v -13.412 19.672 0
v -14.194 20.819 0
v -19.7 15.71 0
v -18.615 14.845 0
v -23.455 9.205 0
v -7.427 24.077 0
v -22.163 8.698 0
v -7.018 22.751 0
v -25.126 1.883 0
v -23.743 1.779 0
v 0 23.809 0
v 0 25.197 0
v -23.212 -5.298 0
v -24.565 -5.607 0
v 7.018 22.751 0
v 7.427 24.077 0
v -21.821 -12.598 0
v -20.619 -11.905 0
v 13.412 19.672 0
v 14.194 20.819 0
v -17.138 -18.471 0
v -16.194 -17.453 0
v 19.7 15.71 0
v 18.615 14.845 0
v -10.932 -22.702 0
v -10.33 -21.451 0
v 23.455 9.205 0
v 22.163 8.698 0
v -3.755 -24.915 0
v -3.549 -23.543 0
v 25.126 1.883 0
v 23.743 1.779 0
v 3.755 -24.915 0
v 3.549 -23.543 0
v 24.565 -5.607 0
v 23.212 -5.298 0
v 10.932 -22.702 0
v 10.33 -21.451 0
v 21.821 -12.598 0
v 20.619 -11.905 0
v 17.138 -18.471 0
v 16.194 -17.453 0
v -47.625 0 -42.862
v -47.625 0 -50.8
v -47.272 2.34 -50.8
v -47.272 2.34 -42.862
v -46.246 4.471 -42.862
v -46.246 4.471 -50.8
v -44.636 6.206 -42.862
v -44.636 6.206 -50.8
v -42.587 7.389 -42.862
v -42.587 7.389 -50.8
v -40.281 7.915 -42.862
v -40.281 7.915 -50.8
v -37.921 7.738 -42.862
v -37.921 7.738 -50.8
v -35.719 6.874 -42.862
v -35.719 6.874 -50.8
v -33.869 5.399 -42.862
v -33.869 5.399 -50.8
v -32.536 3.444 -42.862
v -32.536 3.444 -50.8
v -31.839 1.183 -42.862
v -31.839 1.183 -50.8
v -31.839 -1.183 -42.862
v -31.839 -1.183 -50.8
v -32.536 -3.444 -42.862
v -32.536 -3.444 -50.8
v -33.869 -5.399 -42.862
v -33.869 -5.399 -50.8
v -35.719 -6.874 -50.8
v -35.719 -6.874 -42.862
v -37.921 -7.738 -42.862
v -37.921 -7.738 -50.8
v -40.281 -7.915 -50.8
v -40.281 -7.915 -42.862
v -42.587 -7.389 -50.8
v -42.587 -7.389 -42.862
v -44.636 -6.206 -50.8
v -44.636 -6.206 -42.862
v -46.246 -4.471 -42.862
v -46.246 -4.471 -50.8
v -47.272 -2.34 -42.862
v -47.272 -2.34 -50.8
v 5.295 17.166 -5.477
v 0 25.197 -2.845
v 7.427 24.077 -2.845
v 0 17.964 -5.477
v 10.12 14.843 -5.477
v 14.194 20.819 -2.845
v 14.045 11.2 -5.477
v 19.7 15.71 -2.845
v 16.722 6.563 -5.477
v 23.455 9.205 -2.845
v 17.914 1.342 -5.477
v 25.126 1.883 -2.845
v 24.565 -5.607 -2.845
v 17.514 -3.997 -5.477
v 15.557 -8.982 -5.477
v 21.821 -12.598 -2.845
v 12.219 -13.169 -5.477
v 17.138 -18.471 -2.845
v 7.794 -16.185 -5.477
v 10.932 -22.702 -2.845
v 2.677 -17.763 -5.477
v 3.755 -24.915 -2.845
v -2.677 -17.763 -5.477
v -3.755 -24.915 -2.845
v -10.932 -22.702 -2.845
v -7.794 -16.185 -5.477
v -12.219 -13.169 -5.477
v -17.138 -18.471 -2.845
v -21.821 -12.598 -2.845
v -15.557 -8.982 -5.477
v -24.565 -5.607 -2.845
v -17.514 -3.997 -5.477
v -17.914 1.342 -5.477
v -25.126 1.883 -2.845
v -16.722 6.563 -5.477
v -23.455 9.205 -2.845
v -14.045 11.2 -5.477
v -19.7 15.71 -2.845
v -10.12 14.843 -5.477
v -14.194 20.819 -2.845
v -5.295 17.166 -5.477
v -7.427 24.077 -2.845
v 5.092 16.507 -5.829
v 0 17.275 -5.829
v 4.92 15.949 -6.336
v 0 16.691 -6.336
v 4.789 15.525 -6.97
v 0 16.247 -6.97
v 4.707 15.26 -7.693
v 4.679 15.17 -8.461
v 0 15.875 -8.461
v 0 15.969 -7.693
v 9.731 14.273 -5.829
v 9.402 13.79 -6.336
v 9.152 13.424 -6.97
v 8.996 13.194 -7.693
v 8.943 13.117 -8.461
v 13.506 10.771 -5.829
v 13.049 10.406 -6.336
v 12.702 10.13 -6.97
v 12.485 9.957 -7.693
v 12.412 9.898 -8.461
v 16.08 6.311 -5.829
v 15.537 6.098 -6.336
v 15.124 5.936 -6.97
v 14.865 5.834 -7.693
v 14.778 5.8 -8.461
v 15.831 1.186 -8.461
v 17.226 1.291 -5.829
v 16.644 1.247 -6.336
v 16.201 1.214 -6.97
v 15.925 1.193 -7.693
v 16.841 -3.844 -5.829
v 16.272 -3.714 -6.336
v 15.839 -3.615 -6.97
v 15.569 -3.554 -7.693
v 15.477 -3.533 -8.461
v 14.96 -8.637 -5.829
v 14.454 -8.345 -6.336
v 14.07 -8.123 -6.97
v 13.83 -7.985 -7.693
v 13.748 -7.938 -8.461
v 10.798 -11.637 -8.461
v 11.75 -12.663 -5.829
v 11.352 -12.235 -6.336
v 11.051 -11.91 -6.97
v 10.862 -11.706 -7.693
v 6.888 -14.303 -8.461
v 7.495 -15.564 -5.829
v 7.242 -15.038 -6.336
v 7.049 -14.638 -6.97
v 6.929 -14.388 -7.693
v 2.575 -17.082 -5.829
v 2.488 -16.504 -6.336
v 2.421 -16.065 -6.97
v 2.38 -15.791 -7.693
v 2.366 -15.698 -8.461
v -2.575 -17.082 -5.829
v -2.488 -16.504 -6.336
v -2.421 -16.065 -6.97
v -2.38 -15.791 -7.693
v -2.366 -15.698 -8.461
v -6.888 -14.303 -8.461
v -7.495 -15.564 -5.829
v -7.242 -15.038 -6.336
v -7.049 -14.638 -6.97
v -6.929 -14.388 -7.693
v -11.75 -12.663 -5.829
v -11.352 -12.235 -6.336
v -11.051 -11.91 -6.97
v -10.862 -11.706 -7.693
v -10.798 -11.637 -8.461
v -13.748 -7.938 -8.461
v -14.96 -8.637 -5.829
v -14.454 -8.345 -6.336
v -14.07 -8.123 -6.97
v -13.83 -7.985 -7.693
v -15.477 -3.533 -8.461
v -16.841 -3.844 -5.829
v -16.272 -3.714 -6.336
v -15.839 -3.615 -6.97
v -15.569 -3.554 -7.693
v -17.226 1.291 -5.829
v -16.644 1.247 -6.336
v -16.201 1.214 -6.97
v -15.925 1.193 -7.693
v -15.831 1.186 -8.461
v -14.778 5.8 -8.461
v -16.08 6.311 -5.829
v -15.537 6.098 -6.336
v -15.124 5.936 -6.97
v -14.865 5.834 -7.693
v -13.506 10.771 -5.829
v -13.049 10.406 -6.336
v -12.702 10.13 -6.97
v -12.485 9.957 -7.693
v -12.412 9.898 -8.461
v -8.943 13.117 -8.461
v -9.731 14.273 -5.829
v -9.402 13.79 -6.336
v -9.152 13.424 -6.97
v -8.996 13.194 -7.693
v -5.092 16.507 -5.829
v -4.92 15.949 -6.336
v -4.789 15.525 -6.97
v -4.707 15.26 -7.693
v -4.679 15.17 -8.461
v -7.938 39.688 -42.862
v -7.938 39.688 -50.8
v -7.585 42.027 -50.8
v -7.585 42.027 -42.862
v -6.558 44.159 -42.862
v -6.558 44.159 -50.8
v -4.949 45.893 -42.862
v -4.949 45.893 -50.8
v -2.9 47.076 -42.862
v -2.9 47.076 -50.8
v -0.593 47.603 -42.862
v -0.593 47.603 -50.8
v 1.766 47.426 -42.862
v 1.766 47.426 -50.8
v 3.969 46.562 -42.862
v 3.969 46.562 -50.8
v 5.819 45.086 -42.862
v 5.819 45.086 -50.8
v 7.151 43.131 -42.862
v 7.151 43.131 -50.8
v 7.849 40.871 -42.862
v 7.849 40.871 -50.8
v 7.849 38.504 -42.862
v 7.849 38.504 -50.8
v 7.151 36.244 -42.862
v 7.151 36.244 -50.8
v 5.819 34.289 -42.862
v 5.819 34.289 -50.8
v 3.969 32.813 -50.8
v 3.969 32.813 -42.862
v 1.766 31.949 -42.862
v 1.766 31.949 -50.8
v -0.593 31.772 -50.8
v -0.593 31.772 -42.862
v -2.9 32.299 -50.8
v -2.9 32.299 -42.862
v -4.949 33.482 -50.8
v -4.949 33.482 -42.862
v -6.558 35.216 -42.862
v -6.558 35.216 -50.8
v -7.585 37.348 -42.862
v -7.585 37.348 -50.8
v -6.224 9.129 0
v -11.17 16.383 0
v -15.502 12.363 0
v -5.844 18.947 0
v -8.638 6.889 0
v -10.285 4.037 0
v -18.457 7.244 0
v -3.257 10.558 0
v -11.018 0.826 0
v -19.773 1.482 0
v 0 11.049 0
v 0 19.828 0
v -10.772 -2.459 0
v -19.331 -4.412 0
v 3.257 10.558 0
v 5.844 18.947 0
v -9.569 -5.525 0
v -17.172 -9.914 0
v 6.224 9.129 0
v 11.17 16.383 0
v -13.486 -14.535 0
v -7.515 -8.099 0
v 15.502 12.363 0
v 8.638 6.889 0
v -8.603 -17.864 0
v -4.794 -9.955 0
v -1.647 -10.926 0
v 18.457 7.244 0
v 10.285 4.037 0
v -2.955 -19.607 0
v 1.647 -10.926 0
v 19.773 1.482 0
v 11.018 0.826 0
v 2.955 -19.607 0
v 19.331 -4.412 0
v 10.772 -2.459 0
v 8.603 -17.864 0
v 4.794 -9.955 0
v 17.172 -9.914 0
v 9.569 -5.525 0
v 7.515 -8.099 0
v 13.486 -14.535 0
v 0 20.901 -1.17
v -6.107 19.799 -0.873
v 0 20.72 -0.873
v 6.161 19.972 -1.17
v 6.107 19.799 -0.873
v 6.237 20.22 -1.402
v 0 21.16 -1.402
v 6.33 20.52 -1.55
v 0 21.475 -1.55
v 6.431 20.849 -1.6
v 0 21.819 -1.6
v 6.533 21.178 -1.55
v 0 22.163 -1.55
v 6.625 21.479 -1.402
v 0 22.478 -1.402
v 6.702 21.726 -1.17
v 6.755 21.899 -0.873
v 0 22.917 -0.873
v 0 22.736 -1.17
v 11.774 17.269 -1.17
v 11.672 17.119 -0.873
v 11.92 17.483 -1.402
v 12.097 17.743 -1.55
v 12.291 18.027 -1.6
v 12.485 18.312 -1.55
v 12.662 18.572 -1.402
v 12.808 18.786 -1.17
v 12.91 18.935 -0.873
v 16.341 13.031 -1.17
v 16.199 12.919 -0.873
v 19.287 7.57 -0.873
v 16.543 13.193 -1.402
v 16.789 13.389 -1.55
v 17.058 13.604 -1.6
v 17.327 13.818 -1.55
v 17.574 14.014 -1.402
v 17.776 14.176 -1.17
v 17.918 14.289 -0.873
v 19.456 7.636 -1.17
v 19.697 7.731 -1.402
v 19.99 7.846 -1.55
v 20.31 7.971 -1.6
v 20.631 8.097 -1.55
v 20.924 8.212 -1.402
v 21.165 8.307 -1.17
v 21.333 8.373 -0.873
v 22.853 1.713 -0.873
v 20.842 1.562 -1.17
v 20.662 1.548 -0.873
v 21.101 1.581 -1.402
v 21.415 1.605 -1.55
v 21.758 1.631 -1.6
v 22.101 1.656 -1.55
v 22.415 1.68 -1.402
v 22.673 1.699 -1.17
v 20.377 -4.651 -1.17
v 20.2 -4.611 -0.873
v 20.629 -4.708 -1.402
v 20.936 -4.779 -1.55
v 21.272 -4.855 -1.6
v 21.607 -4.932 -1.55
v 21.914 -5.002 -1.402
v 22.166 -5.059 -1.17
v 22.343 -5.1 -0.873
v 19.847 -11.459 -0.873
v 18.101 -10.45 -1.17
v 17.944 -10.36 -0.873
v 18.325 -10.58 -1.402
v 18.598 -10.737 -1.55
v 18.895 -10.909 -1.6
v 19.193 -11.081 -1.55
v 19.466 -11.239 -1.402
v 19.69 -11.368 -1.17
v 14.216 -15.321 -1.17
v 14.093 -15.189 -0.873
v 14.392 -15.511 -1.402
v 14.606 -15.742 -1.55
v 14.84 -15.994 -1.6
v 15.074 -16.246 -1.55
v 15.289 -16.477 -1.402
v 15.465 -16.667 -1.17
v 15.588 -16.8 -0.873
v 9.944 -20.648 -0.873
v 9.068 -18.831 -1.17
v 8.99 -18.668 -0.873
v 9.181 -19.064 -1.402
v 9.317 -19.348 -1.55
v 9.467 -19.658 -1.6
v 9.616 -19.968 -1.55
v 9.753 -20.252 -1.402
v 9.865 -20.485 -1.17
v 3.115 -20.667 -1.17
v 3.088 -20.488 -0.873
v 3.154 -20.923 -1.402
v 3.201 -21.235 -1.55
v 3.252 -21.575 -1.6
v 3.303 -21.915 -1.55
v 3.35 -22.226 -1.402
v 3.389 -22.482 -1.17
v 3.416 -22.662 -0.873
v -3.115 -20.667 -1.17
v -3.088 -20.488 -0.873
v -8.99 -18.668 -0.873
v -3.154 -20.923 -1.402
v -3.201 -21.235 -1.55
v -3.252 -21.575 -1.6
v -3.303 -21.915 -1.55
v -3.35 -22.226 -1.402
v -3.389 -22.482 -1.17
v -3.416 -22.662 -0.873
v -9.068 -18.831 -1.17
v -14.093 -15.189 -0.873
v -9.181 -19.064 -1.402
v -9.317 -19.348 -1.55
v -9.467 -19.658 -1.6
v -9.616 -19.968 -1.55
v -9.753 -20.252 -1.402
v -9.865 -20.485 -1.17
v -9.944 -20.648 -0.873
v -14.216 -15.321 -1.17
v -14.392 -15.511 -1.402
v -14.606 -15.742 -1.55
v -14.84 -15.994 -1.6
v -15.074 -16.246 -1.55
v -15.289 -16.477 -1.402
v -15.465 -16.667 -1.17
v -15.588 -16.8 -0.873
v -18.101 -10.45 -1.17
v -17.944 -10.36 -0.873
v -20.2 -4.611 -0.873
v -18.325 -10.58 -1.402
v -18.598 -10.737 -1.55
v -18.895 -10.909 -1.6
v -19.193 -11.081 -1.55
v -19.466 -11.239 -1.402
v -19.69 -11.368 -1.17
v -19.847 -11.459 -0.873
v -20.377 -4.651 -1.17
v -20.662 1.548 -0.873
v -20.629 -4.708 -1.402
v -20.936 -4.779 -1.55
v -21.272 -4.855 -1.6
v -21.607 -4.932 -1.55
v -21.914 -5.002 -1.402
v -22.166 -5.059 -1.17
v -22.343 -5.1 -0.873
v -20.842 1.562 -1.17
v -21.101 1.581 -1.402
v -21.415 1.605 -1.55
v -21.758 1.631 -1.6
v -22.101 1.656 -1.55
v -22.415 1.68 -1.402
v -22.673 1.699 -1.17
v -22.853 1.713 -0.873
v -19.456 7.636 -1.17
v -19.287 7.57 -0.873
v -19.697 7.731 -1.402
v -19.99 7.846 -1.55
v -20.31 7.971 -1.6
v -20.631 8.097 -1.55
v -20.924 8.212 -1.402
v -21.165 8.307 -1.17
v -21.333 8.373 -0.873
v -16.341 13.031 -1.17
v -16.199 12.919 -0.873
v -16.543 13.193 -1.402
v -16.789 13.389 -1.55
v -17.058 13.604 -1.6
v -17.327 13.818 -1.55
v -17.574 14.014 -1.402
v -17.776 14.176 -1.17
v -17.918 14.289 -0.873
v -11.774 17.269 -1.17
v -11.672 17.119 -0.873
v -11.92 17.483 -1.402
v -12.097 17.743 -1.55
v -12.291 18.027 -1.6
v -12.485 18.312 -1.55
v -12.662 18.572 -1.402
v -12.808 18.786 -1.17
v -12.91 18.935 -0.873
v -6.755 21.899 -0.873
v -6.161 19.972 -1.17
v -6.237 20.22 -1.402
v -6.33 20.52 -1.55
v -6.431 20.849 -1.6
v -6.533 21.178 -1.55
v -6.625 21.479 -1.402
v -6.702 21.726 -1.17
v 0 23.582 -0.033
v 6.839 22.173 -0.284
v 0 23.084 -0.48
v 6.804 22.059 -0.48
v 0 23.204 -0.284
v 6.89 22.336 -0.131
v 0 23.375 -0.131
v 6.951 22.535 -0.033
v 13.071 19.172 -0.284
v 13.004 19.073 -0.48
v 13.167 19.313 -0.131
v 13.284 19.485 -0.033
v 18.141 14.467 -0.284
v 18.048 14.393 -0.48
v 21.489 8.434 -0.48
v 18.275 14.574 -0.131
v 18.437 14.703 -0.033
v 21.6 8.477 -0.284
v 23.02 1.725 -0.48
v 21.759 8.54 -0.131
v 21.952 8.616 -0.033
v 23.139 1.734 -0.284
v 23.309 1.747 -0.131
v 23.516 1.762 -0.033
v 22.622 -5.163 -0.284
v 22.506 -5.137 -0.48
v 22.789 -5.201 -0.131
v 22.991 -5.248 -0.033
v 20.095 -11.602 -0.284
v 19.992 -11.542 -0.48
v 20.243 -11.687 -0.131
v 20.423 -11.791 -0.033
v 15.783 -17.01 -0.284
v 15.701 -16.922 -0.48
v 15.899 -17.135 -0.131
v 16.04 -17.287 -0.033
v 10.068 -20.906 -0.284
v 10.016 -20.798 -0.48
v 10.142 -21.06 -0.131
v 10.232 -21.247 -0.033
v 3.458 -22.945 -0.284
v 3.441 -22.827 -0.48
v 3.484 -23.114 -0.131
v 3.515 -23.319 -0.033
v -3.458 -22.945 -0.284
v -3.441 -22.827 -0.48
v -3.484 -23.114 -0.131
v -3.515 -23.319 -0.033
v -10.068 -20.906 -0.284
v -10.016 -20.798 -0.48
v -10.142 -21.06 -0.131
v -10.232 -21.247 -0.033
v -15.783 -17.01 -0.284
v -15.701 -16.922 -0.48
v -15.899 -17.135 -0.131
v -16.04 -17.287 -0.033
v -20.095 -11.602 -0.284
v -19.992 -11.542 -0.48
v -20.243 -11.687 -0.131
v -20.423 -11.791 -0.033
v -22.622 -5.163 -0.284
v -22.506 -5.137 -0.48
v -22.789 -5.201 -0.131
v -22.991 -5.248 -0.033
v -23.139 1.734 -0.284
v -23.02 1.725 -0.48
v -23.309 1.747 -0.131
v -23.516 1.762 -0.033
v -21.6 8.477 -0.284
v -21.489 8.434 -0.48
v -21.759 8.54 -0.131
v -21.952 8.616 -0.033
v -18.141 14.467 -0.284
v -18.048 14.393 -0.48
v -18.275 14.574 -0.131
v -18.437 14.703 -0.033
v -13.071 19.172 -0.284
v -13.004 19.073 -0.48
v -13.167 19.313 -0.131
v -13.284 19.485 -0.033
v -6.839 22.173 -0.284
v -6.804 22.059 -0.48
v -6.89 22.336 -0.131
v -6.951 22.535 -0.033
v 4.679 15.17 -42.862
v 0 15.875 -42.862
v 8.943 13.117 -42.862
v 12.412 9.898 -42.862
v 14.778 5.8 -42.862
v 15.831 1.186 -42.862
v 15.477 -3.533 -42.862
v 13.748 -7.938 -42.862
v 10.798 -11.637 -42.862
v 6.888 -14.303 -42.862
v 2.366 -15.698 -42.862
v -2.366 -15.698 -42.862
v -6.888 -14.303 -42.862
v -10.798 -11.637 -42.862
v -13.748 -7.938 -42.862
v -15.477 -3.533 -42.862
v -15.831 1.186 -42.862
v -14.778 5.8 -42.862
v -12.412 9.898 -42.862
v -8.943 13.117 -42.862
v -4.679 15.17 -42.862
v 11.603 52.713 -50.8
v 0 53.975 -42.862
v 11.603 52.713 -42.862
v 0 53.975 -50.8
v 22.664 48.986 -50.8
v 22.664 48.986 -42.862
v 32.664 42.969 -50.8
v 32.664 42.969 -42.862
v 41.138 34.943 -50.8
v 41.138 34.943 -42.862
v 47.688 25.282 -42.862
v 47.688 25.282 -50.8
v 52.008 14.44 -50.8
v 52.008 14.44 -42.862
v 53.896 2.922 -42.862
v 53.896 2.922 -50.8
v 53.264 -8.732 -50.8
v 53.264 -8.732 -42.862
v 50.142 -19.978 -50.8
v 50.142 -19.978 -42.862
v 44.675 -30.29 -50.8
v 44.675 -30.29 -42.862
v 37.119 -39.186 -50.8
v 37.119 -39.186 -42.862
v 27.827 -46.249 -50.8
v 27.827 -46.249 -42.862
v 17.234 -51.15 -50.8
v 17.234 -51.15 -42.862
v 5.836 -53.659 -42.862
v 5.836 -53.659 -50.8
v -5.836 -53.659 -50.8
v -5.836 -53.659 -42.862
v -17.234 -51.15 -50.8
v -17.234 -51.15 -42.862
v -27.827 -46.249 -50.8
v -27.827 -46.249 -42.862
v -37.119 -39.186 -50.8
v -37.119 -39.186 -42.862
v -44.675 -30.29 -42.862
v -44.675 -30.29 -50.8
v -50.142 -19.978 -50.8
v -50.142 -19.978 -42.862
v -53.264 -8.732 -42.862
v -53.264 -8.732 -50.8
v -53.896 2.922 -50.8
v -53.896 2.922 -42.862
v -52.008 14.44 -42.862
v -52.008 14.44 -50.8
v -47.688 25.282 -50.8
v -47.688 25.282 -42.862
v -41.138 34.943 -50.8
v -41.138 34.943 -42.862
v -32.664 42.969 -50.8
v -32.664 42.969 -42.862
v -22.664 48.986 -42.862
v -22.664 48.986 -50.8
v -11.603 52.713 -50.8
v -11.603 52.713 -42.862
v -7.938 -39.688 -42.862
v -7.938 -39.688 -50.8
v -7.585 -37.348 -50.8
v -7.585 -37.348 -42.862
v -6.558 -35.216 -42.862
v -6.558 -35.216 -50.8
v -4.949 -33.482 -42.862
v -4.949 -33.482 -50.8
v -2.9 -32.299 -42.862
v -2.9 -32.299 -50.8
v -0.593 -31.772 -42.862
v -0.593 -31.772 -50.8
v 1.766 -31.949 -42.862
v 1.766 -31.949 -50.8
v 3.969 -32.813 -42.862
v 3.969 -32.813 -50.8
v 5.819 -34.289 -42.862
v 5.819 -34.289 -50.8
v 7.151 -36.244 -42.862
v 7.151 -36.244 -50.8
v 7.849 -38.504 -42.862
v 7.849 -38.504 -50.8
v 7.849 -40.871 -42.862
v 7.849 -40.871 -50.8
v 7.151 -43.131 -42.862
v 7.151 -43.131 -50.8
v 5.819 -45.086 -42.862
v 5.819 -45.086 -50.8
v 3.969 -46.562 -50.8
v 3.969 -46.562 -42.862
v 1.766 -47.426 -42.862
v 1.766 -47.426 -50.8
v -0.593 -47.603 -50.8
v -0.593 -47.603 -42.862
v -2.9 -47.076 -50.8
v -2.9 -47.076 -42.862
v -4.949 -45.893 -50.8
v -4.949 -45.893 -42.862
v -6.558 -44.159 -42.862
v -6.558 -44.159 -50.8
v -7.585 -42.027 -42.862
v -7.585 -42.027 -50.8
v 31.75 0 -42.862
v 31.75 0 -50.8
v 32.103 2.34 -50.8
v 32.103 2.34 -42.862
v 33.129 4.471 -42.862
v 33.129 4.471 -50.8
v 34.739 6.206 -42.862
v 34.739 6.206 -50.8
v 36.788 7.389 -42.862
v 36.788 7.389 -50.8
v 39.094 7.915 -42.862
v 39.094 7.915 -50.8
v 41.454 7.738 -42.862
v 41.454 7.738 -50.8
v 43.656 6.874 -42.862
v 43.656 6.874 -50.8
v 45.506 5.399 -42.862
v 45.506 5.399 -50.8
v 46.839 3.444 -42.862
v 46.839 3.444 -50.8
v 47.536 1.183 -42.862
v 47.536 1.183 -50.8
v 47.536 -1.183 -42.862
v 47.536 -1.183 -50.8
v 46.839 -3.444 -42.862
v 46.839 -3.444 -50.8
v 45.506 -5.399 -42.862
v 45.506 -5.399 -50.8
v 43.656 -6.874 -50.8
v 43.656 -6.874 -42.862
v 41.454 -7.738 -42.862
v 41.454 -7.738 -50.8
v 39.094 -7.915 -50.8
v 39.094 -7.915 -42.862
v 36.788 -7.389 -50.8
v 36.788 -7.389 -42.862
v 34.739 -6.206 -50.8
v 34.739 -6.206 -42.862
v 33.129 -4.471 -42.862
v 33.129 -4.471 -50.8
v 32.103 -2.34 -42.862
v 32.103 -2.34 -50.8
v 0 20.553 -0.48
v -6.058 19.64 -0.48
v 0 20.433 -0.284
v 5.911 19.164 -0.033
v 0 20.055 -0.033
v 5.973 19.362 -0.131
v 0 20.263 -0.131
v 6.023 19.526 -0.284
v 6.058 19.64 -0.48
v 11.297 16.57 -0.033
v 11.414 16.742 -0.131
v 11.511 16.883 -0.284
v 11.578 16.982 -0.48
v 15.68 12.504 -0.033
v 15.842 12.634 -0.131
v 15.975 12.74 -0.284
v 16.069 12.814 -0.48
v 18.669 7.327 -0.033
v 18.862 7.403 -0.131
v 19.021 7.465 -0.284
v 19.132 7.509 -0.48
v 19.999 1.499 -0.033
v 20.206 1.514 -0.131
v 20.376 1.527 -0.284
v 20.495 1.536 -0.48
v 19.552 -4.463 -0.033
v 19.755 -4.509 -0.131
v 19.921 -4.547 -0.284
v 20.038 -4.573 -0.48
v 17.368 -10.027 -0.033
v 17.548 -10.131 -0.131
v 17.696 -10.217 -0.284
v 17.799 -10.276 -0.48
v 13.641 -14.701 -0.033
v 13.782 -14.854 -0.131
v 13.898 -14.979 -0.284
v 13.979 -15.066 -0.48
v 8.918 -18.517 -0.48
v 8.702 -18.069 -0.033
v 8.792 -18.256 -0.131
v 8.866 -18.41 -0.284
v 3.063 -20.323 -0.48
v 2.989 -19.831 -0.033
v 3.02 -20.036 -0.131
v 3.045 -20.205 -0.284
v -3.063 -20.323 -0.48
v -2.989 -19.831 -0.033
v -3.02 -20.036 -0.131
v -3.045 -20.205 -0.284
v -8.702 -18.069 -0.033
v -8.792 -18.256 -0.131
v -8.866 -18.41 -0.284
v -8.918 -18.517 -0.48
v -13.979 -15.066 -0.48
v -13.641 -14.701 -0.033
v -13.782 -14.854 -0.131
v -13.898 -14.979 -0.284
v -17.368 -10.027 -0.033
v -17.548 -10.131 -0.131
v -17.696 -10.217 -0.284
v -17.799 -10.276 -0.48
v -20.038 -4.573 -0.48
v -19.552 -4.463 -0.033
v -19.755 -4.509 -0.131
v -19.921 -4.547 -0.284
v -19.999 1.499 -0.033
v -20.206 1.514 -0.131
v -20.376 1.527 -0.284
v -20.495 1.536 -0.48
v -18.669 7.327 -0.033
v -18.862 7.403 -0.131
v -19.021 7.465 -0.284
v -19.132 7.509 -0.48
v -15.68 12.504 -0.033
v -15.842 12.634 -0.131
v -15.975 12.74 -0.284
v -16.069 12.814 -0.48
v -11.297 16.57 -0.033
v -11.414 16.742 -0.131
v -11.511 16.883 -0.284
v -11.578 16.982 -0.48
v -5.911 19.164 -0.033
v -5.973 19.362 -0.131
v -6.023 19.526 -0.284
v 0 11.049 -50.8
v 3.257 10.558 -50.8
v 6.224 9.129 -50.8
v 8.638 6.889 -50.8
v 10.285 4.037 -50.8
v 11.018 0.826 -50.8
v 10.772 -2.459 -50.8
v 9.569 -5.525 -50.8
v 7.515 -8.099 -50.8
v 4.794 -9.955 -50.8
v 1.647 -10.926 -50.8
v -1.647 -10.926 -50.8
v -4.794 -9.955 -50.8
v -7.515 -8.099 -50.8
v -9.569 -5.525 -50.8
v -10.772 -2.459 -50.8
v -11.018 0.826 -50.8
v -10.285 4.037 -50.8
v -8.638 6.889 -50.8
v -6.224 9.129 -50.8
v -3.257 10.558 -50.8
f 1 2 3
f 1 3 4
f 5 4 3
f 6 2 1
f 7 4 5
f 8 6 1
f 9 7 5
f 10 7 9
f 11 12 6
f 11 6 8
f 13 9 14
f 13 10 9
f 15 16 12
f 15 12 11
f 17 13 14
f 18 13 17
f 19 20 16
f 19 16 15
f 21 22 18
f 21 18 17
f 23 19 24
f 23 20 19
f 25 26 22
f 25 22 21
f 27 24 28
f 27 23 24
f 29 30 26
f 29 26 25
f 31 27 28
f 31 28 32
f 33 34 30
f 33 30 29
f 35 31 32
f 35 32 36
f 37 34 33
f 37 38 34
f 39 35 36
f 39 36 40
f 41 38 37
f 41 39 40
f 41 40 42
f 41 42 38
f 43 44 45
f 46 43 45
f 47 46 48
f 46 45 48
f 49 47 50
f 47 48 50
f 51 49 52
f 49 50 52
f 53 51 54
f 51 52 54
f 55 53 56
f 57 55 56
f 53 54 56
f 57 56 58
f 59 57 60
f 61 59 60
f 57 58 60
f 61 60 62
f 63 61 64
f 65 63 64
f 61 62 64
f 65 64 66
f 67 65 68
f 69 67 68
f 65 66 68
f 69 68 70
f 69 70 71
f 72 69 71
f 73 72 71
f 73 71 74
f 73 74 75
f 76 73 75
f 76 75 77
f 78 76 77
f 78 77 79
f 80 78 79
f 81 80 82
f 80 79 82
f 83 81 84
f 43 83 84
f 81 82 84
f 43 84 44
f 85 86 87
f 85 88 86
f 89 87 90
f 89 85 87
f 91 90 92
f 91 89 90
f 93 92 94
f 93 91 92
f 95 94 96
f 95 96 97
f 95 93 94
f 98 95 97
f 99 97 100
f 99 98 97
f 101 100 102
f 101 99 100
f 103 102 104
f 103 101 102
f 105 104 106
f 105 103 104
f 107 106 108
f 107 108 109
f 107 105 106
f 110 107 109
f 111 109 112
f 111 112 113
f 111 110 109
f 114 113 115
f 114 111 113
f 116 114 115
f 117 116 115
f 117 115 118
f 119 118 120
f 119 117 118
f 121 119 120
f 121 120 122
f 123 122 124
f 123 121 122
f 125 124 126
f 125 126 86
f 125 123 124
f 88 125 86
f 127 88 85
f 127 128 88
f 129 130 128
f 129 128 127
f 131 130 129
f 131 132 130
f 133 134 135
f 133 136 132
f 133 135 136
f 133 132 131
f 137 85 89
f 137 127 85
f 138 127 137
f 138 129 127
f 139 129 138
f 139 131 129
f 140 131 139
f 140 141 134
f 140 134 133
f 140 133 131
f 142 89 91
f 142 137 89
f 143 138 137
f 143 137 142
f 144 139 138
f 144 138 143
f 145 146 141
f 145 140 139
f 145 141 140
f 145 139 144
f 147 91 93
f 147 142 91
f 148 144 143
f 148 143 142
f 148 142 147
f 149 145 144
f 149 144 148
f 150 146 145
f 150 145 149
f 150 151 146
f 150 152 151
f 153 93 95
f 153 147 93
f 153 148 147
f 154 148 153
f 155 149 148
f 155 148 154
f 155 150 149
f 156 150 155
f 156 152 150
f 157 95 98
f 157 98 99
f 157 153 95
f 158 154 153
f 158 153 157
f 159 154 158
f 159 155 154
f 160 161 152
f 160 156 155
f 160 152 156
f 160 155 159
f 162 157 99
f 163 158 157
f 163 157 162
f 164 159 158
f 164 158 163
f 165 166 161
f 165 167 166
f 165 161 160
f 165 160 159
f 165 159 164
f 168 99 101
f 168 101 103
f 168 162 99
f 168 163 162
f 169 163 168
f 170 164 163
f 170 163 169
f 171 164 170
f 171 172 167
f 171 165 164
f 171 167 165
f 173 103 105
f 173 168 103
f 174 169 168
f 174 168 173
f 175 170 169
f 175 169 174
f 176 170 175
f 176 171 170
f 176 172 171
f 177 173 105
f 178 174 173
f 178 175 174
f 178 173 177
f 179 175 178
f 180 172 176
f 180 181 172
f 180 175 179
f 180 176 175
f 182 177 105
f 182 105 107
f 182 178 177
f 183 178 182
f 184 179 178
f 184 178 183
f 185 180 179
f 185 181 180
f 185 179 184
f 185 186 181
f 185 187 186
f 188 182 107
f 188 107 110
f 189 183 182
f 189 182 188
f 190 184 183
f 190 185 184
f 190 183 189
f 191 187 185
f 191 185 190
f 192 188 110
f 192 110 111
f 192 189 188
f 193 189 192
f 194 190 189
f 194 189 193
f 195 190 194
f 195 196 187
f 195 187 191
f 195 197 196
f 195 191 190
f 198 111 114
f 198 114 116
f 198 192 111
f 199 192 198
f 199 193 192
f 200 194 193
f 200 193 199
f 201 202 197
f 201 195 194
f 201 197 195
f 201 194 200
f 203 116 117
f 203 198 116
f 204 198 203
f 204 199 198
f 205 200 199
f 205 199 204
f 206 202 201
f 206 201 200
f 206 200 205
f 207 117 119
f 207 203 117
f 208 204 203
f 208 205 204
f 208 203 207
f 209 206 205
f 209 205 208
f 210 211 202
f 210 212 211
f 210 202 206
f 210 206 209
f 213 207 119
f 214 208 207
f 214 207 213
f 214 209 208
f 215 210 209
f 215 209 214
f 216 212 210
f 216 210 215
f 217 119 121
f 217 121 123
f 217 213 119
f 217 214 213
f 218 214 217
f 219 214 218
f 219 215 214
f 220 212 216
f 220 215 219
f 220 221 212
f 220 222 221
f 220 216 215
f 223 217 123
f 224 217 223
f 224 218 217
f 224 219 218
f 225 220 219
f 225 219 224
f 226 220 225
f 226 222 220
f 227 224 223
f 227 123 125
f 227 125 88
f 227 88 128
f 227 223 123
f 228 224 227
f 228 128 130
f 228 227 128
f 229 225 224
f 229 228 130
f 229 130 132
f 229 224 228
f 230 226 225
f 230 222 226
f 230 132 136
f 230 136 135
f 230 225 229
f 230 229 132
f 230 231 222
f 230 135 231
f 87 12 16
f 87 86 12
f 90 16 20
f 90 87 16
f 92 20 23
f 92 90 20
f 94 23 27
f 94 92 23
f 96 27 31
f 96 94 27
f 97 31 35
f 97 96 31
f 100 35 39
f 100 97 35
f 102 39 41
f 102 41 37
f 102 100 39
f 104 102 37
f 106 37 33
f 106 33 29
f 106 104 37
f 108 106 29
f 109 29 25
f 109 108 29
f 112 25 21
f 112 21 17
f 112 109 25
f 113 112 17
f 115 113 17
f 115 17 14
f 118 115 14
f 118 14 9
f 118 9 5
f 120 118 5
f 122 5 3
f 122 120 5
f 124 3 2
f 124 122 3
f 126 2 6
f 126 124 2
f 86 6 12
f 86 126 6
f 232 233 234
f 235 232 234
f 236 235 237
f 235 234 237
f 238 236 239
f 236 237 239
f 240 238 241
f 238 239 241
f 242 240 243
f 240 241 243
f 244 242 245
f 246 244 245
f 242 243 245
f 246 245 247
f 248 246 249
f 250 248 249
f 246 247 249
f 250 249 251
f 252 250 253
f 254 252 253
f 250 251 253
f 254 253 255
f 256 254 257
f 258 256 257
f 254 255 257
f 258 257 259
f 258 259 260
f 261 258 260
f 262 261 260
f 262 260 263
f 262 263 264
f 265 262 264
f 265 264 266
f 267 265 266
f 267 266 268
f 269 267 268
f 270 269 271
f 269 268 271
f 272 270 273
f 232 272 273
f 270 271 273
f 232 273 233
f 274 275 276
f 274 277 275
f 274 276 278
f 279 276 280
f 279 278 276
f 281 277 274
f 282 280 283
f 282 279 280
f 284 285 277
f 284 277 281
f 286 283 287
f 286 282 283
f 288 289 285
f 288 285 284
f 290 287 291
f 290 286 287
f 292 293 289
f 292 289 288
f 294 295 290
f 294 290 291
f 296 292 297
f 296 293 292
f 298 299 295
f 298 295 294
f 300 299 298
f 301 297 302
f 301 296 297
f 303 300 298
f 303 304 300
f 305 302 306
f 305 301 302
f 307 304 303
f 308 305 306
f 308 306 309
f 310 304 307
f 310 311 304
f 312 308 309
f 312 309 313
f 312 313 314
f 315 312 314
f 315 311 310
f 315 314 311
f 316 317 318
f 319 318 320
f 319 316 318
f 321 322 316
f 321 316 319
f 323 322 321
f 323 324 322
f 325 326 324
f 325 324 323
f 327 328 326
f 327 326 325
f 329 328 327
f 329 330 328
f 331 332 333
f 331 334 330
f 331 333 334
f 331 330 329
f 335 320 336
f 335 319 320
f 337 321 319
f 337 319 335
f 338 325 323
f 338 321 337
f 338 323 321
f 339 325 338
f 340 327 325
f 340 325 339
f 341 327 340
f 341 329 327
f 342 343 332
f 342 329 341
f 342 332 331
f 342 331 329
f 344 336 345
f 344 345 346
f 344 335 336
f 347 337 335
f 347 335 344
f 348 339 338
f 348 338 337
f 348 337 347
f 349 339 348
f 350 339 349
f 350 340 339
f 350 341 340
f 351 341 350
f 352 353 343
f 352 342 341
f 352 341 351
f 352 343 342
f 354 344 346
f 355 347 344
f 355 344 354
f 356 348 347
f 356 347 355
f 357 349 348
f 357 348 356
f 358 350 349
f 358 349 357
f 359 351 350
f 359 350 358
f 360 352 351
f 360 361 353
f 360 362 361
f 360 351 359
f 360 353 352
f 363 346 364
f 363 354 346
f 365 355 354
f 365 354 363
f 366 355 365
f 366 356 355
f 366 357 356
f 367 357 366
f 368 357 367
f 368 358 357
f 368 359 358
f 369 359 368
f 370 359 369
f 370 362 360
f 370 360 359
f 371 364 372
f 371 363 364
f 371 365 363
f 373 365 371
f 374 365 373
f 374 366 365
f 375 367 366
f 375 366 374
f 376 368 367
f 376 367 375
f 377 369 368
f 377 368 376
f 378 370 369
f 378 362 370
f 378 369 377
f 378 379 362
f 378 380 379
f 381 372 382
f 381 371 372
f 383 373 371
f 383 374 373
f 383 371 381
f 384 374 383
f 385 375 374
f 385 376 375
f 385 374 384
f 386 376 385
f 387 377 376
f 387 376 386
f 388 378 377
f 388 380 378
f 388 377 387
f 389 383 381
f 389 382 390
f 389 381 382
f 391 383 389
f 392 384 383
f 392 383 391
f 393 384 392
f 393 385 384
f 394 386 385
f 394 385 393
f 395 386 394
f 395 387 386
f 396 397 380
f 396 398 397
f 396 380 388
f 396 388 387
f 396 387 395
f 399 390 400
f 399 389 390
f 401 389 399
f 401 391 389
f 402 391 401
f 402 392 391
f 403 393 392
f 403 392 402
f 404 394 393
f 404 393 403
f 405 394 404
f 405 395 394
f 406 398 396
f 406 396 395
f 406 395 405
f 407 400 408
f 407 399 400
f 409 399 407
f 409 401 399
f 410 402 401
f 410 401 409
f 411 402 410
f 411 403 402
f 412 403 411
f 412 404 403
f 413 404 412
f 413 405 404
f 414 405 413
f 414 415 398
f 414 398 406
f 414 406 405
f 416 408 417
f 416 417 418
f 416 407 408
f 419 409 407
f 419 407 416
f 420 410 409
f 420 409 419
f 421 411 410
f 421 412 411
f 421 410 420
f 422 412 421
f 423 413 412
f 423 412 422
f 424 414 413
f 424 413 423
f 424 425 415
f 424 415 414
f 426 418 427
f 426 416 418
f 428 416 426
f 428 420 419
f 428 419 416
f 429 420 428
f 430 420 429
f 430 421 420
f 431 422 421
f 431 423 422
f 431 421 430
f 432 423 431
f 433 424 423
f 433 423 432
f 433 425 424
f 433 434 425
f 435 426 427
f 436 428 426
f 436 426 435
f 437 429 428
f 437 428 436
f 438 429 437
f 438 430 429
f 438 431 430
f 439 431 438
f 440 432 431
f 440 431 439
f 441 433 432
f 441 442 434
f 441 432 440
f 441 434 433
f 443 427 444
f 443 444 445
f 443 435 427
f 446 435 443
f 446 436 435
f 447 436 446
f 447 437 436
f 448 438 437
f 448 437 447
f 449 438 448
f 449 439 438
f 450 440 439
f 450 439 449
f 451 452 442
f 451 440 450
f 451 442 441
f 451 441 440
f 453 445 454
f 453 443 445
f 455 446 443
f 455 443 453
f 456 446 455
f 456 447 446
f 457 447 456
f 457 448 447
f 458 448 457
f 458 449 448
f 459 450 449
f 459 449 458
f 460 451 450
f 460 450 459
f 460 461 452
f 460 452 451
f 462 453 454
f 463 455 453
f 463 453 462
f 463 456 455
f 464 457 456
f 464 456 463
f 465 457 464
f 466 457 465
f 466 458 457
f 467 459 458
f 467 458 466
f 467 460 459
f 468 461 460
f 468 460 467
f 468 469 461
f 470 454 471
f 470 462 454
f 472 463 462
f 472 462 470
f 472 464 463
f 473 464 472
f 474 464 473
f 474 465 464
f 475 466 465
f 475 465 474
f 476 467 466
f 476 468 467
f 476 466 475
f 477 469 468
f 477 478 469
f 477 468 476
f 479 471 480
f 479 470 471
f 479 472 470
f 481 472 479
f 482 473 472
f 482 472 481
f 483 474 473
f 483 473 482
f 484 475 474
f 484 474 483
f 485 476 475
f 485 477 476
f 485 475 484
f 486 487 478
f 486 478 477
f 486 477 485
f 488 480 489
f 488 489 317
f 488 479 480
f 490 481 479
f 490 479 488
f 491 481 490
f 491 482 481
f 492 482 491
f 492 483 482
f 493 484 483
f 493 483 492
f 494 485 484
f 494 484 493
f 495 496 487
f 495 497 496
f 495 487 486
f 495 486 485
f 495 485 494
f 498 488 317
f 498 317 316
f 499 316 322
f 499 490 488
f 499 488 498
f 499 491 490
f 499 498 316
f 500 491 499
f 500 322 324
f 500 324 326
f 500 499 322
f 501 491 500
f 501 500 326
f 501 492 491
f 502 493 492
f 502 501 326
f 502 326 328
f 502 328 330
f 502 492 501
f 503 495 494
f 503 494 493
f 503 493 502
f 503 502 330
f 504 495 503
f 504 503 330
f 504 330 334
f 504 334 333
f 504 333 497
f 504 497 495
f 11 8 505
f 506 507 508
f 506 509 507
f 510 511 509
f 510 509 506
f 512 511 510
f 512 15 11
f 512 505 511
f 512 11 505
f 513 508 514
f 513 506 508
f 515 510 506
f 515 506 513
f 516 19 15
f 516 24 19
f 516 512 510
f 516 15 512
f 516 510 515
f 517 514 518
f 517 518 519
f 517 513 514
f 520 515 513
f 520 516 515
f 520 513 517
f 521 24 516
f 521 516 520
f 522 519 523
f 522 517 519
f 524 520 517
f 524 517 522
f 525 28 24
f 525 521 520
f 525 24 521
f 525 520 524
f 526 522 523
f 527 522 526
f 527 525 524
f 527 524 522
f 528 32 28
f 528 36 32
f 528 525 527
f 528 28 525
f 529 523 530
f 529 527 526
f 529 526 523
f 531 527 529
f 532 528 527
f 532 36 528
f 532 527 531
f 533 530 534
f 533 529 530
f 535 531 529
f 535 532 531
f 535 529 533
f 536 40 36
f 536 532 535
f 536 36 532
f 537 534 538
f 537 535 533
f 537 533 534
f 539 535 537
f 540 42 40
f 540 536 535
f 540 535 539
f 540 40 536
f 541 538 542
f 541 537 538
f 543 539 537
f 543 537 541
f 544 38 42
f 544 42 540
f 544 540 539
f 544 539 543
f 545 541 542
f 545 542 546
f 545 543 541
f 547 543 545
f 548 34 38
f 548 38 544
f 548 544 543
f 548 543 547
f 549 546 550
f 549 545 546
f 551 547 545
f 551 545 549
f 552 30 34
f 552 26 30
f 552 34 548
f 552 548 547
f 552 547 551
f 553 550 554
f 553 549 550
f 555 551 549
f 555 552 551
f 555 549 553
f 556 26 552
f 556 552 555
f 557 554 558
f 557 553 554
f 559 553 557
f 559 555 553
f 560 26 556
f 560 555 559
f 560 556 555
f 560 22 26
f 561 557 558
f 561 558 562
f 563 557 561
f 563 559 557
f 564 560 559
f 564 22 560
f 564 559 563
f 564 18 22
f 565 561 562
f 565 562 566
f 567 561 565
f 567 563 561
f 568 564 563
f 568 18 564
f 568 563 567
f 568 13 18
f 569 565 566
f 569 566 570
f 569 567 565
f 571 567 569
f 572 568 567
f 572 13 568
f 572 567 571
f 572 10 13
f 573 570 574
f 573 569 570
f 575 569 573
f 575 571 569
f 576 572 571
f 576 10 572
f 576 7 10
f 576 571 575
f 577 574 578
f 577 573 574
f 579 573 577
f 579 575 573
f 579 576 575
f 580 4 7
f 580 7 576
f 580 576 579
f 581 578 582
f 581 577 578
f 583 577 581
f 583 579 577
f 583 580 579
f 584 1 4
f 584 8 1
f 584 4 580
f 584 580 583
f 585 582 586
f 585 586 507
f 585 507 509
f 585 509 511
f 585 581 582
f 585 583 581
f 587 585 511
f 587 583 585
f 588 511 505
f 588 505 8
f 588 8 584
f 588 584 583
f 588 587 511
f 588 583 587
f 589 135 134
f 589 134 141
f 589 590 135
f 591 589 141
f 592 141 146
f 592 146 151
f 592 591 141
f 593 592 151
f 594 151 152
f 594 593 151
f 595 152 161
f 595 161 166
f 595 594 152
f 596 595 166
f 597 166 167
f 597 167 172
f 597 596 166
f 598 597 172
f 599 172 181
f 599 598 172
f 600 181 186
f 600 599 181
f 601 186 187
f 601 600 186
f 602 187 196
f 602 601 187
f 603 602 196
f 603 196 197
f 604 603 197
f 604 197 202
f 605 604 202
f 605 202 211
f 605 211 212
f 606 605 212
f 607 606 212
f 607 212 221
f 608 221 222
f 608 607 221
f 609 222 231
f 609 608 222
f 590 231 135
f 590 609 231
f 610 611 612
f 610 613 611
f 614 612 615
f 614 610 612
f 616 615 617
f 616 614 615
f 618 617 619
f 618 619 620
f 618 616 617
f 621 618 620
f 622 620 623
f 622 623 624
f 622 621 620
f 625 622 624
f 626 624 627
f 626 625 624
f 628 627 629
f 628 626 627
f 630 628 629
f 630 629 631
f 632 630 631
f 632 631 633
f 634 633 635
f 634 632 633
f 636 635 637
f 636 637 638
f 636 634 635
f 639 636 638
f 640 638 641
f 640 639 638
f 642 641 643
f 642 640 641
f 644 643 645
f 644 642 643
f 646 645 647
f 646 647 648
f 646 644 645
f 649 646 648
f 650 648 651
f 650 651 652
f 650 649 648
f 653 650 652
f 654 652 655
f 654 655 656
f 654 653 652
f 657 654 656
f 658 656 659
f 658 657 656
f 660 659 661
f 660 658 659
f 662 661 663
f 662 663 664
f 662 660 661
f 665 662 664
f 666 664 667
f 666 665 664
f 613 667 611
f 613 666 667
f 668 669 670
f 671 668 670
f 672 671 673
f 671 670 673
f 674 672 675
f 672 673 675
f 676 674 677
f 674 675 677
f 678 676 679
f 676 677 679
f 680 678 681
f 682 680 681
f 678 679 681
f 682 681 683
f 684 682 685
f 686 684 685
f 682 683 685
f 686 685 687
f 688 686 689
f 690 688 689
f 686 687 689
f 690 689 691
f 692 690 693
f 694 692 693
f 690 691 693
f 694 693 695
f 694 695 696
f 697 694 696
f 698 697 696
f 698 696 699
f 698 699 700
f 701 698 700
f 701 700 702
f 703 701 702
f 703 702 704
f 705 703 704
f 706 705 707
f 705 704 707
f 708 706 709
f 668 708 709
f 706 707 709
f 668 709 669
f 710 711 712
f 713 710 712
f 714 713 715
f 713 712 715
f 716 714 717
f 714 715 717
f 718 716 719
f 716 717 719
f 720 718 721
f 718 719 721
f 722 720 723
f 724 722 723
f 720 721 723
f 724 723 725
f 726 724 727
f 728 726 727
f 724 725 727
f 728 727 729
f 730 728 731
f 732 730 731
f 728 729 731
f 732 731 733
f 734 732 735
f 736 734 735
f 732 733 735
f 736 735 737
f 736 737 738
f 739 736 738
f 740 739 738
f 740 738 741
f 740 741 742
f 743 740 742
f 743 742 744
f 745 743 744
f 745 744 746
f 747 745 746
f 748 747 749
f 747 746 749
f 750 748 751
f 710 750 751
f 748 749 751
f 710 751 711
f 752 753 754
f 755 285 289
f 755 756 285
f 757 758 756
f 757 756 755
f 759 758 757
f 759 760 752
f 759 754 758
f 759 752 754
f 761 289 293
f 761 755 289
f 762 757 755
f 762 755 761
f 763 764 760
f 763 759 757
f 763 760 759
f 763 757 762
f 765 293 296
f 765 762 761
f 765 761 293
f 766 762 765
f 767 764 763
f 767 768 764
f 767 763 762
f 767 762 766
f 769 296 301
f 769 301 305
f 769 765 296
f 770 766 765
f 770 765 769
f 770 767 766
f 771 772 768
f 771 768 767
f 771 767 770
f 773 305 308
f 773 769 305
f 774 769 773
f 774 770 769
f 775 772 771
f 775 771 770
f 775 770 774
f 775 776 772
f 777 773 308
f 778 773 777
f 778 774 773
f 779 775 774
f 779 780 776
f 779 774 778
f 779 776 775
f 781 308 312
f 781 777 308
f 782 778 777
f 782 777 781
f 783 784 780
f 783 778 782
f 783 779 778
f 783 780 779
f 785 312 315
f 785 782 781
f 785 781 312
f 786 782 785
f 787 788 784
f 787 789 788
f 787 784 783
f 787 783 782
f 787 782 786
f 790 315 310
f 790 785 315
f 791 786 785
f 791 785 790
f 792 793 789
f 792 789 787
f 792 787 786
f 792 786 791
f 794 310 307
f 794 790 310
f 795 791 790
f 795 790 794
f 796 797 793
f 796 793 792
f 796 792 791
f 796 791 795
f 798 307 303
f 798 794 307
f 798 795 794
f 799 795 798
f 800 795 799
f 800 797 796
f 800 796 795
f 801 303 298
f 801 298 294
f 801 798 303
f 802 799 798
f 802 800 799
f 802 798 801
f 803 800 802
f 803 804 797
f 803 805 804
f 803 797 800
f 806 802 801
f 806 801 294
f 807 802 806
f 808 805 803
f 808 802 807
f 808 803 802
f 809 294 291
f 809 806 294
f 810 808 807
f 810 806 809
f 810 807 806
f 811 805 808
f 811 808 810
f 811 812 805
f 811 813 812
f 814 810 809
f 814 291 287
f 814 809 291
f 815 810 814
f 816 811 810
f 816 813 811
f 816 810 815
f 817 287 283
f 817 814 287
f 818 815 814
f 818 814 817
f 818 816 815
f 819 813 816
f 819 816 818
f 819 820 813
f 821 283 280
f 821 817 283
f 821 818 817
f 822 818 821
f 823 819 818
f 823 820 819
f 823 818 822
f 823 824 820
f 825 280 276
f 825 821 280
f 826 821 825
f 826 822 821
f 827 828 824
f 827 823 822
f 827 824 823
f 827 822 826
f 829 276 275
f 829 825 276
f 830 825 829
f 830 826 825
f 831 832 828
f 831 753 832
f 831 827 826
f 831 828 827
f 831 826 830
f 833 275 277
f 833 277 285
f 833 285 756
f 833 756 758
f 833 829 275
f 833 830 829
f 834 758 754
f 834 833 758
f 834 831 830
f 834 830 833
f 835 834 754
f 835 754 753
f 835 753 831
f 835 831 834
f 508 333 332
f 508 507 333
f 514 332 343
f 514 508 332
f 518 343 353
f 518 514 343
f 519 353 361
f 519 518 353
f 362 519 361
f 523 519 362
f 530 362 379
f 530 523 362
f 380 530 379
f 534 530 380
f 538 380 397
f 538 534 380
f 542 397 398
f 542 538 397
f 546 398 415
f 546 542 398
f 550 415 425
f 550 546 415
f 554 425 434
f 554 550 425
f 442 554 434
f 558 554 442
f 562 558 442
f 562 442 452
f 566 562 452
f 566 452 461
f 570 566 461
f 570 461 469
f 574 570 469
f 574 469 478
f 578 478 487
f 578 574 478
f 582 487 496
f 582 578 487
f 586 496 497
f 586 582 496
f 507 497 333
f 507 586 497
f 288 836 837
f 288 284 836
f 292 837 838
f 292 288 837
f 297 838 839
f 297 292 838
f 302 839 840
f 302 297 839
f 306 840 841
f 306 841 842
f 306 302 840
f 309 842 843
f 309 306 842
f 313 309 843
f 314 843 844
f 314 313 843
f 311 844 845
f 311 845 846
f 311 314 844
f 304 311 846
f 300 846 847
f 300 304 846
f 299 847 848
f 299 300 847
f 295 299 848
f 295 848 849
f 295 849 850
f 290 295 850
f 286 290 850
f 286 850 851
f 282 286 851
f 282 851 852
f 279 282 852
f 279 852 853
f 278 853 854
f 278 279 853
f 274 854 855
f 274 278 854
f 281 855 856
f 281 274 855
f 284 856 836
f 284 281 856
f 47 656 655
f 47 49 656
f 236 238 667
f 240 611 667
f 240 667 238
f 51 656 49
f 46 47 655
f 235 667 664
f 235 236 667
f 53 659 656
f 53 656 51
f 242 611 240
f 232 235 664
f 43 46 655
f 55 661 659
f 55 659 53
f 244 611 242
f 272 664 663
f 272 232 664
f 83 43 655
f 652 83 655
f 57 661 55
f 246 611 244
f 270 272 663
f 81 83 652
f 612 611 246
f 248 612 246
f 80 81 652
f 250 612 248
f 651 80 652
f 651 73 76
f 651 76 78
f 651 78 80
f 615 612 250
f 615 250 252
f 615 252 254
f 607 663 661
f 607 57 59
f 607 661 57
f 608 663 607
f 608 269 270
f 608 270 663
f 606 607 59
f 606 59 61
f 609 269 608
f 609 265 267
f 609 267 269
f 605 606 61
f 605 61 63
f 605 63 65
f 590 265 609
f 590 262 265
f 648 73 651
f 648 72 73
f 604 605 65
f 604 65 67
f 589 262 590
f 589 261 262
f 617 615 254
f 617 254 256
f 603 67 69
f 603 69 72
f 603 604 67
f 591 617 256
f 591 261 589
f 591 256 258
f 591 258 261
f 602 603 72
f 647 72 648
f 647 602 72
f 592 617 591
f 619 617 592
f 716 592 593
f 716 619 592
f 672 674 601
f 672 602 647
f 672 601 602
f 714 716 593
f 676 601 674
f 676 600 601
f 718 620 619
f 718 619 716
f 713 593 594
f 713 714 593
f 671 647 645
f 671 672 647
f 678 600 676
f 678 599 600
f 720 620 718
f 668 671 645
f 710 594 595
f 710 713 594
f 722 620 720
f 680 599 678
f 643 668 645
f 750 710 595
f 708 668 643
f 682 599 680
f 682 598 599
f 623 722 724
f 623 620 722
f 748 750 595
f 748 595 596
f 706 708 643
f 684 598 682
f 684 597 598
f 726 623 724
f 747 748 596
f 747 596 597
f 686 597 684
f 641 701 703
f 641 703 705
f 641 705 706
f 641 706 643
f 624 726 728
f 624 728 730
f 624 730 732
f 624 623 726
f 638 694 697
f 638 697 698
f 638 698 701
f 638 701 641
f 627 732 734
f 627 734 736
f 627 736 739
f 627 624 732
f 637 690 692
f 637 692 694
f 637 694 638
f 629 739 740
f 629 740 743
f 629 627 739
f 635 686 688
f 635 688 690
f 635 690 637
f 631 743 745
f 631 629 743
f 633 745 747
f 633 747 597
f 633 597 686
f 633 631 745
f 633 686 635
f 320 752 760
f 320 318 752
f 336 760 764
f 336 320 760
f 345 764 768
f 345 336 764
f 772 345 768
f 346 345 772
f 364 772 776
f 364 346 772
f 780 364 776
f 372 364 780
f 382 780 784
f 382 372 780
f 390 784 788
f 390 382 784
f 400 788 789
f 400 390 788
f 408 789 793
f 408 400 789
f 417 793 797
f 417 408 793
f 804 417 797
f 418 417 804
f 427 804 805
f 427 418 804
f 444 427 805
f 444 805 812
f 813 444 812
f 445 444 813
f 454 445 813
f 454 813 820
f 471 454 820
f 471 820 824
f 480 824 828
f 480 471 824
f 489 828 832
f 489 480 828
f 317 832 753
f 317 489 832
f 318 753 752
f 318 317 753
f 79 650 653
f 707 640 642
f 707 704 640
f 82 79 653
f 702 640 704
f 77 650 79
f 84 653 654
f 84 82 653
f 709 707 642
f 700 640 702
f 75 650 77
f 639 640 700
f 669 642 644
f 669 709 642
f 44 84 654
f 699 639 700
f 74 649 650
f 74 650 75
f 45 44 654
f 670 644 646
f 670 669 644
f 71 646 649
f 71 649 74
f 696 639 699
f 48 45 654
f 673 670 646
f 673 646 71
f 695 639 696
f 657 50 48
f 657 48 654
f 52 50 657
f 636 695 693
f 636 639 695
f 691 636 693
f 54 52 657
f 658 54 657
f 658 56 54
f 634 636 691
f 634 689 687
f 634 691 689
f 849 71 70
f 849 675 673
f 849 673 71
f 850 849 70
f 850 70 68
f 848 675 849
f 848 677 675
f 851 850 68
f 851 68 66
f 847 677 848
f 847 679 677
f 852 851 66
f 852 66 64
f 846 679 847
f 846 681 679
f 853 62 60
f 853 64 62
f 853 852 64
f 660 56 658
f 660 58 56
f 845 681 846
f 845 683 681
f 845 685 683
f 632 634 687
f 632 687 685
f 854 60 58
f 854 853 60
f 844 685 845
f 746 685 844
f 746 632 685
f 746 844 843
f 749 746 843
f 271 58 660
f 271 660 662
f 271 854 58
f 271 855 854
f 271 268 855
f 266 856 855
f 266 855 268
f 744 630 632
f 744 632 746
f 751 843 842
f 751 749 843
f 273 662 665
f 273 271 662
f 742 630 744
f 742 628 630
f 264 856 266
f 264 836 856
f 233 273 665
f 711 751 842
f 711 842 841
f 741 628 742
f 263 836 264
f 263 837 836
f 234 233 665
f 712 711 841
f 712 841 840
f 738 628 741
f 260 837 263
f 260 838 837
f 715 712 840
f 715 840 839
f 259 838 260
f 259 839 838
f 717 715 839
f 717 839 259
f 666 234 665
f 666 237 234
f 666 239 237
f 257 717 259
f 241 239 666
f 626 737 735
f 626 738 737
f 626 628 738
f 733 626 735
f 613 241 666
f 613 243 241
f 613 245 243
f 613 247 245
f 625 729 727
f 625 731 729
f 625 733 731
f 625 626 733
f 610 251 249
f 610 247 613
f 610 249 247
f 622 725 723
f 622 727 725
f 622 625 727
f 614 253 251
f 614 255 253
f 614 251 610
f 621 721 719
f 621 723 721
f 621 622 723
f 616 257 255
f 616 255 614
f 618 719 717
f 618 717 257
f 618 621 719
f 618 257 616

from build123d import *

# Parameters (mm, degrees)
SKETCH2_R          = 7.9375
CUT_EXTRUDE1_DEPTH = 7.9375


with BuildPart() as part:
    # Sketch1 → Revolve1 (revolve)
    with BuildSketch(Plane(origin=(0, 0, 0), x_dir=(0, 0, -1), z_dir=(1, 0, 0))):
        with BuildLine():
            Line((0, 11.049), (0, 19.828027725))
            ThreePointArc((0, 19.828027725), (0.130798304, 20.262622907), (0.479738309, 20.552833247))
            Line((0.479738309, 20.552833247), (0.872854821, 20.719701306))
            ThreePointArc((0.872854821, 20.719701306), (1.6002, 21.8186), (0.872854821, 22.917498694))
            Line((0.872854821, 22.917498694), (0.479738309, 23.084366753))
            ThreePointArc((0.479738309, 23.084366753), (0.130798304, 23.374577093), (0, 23.809172275))
            Line((0, 23.809172275), (0, 25.1968))
            Line((0, 25.1968), (2.8448, 25.1968))
            Line((2.8448, 25.1968), (5.477292593, 17.964086045))
            ThreePointArc((5.477292593, 17.964086045), (6.639711478, 16.449192259), (8.460816664, 15.875))
            Line((8.460816664, 15.875), (42.8625, 15.875))
            Line((42.8625, 15.875), (42.8625, 53.975))
            Line((42.8625, 53.975), (50.8, 53.975))
            Line((50.8, 53.975), (50.8, 28.575))
            Line((50.8, 28.575), (50.8, 11.049))
            Line((50.8, 11.049), (0, 11.049))
        make_face()
    revolve(axis=Axis((0, 0, 0), (0, 0, -1)))

    # Sketch2 → Cut-Extrude1 (cut)
    with BuildSketch(Plane(origin=(0, 0, -50.8), x_dir=(-1, 0, 0), z_dir=(0, 0, -1))):
        with Locations((0, 39.6875)):
            Circle(SKETCH2_R)
        with Locations((39.6875, 0)):
            Circle(SKETCH2_R)
        with Locations((0, -39.6875)):
            Circle(SKETCH2_R)
        with Locations((-39.6875, 0)):
            Circle(SKETCH2_R)
    extrude(amount=-CUT_EXTRUDE1_DEPTH, mode=Mode.SUBTRACT)


solid = part.part
